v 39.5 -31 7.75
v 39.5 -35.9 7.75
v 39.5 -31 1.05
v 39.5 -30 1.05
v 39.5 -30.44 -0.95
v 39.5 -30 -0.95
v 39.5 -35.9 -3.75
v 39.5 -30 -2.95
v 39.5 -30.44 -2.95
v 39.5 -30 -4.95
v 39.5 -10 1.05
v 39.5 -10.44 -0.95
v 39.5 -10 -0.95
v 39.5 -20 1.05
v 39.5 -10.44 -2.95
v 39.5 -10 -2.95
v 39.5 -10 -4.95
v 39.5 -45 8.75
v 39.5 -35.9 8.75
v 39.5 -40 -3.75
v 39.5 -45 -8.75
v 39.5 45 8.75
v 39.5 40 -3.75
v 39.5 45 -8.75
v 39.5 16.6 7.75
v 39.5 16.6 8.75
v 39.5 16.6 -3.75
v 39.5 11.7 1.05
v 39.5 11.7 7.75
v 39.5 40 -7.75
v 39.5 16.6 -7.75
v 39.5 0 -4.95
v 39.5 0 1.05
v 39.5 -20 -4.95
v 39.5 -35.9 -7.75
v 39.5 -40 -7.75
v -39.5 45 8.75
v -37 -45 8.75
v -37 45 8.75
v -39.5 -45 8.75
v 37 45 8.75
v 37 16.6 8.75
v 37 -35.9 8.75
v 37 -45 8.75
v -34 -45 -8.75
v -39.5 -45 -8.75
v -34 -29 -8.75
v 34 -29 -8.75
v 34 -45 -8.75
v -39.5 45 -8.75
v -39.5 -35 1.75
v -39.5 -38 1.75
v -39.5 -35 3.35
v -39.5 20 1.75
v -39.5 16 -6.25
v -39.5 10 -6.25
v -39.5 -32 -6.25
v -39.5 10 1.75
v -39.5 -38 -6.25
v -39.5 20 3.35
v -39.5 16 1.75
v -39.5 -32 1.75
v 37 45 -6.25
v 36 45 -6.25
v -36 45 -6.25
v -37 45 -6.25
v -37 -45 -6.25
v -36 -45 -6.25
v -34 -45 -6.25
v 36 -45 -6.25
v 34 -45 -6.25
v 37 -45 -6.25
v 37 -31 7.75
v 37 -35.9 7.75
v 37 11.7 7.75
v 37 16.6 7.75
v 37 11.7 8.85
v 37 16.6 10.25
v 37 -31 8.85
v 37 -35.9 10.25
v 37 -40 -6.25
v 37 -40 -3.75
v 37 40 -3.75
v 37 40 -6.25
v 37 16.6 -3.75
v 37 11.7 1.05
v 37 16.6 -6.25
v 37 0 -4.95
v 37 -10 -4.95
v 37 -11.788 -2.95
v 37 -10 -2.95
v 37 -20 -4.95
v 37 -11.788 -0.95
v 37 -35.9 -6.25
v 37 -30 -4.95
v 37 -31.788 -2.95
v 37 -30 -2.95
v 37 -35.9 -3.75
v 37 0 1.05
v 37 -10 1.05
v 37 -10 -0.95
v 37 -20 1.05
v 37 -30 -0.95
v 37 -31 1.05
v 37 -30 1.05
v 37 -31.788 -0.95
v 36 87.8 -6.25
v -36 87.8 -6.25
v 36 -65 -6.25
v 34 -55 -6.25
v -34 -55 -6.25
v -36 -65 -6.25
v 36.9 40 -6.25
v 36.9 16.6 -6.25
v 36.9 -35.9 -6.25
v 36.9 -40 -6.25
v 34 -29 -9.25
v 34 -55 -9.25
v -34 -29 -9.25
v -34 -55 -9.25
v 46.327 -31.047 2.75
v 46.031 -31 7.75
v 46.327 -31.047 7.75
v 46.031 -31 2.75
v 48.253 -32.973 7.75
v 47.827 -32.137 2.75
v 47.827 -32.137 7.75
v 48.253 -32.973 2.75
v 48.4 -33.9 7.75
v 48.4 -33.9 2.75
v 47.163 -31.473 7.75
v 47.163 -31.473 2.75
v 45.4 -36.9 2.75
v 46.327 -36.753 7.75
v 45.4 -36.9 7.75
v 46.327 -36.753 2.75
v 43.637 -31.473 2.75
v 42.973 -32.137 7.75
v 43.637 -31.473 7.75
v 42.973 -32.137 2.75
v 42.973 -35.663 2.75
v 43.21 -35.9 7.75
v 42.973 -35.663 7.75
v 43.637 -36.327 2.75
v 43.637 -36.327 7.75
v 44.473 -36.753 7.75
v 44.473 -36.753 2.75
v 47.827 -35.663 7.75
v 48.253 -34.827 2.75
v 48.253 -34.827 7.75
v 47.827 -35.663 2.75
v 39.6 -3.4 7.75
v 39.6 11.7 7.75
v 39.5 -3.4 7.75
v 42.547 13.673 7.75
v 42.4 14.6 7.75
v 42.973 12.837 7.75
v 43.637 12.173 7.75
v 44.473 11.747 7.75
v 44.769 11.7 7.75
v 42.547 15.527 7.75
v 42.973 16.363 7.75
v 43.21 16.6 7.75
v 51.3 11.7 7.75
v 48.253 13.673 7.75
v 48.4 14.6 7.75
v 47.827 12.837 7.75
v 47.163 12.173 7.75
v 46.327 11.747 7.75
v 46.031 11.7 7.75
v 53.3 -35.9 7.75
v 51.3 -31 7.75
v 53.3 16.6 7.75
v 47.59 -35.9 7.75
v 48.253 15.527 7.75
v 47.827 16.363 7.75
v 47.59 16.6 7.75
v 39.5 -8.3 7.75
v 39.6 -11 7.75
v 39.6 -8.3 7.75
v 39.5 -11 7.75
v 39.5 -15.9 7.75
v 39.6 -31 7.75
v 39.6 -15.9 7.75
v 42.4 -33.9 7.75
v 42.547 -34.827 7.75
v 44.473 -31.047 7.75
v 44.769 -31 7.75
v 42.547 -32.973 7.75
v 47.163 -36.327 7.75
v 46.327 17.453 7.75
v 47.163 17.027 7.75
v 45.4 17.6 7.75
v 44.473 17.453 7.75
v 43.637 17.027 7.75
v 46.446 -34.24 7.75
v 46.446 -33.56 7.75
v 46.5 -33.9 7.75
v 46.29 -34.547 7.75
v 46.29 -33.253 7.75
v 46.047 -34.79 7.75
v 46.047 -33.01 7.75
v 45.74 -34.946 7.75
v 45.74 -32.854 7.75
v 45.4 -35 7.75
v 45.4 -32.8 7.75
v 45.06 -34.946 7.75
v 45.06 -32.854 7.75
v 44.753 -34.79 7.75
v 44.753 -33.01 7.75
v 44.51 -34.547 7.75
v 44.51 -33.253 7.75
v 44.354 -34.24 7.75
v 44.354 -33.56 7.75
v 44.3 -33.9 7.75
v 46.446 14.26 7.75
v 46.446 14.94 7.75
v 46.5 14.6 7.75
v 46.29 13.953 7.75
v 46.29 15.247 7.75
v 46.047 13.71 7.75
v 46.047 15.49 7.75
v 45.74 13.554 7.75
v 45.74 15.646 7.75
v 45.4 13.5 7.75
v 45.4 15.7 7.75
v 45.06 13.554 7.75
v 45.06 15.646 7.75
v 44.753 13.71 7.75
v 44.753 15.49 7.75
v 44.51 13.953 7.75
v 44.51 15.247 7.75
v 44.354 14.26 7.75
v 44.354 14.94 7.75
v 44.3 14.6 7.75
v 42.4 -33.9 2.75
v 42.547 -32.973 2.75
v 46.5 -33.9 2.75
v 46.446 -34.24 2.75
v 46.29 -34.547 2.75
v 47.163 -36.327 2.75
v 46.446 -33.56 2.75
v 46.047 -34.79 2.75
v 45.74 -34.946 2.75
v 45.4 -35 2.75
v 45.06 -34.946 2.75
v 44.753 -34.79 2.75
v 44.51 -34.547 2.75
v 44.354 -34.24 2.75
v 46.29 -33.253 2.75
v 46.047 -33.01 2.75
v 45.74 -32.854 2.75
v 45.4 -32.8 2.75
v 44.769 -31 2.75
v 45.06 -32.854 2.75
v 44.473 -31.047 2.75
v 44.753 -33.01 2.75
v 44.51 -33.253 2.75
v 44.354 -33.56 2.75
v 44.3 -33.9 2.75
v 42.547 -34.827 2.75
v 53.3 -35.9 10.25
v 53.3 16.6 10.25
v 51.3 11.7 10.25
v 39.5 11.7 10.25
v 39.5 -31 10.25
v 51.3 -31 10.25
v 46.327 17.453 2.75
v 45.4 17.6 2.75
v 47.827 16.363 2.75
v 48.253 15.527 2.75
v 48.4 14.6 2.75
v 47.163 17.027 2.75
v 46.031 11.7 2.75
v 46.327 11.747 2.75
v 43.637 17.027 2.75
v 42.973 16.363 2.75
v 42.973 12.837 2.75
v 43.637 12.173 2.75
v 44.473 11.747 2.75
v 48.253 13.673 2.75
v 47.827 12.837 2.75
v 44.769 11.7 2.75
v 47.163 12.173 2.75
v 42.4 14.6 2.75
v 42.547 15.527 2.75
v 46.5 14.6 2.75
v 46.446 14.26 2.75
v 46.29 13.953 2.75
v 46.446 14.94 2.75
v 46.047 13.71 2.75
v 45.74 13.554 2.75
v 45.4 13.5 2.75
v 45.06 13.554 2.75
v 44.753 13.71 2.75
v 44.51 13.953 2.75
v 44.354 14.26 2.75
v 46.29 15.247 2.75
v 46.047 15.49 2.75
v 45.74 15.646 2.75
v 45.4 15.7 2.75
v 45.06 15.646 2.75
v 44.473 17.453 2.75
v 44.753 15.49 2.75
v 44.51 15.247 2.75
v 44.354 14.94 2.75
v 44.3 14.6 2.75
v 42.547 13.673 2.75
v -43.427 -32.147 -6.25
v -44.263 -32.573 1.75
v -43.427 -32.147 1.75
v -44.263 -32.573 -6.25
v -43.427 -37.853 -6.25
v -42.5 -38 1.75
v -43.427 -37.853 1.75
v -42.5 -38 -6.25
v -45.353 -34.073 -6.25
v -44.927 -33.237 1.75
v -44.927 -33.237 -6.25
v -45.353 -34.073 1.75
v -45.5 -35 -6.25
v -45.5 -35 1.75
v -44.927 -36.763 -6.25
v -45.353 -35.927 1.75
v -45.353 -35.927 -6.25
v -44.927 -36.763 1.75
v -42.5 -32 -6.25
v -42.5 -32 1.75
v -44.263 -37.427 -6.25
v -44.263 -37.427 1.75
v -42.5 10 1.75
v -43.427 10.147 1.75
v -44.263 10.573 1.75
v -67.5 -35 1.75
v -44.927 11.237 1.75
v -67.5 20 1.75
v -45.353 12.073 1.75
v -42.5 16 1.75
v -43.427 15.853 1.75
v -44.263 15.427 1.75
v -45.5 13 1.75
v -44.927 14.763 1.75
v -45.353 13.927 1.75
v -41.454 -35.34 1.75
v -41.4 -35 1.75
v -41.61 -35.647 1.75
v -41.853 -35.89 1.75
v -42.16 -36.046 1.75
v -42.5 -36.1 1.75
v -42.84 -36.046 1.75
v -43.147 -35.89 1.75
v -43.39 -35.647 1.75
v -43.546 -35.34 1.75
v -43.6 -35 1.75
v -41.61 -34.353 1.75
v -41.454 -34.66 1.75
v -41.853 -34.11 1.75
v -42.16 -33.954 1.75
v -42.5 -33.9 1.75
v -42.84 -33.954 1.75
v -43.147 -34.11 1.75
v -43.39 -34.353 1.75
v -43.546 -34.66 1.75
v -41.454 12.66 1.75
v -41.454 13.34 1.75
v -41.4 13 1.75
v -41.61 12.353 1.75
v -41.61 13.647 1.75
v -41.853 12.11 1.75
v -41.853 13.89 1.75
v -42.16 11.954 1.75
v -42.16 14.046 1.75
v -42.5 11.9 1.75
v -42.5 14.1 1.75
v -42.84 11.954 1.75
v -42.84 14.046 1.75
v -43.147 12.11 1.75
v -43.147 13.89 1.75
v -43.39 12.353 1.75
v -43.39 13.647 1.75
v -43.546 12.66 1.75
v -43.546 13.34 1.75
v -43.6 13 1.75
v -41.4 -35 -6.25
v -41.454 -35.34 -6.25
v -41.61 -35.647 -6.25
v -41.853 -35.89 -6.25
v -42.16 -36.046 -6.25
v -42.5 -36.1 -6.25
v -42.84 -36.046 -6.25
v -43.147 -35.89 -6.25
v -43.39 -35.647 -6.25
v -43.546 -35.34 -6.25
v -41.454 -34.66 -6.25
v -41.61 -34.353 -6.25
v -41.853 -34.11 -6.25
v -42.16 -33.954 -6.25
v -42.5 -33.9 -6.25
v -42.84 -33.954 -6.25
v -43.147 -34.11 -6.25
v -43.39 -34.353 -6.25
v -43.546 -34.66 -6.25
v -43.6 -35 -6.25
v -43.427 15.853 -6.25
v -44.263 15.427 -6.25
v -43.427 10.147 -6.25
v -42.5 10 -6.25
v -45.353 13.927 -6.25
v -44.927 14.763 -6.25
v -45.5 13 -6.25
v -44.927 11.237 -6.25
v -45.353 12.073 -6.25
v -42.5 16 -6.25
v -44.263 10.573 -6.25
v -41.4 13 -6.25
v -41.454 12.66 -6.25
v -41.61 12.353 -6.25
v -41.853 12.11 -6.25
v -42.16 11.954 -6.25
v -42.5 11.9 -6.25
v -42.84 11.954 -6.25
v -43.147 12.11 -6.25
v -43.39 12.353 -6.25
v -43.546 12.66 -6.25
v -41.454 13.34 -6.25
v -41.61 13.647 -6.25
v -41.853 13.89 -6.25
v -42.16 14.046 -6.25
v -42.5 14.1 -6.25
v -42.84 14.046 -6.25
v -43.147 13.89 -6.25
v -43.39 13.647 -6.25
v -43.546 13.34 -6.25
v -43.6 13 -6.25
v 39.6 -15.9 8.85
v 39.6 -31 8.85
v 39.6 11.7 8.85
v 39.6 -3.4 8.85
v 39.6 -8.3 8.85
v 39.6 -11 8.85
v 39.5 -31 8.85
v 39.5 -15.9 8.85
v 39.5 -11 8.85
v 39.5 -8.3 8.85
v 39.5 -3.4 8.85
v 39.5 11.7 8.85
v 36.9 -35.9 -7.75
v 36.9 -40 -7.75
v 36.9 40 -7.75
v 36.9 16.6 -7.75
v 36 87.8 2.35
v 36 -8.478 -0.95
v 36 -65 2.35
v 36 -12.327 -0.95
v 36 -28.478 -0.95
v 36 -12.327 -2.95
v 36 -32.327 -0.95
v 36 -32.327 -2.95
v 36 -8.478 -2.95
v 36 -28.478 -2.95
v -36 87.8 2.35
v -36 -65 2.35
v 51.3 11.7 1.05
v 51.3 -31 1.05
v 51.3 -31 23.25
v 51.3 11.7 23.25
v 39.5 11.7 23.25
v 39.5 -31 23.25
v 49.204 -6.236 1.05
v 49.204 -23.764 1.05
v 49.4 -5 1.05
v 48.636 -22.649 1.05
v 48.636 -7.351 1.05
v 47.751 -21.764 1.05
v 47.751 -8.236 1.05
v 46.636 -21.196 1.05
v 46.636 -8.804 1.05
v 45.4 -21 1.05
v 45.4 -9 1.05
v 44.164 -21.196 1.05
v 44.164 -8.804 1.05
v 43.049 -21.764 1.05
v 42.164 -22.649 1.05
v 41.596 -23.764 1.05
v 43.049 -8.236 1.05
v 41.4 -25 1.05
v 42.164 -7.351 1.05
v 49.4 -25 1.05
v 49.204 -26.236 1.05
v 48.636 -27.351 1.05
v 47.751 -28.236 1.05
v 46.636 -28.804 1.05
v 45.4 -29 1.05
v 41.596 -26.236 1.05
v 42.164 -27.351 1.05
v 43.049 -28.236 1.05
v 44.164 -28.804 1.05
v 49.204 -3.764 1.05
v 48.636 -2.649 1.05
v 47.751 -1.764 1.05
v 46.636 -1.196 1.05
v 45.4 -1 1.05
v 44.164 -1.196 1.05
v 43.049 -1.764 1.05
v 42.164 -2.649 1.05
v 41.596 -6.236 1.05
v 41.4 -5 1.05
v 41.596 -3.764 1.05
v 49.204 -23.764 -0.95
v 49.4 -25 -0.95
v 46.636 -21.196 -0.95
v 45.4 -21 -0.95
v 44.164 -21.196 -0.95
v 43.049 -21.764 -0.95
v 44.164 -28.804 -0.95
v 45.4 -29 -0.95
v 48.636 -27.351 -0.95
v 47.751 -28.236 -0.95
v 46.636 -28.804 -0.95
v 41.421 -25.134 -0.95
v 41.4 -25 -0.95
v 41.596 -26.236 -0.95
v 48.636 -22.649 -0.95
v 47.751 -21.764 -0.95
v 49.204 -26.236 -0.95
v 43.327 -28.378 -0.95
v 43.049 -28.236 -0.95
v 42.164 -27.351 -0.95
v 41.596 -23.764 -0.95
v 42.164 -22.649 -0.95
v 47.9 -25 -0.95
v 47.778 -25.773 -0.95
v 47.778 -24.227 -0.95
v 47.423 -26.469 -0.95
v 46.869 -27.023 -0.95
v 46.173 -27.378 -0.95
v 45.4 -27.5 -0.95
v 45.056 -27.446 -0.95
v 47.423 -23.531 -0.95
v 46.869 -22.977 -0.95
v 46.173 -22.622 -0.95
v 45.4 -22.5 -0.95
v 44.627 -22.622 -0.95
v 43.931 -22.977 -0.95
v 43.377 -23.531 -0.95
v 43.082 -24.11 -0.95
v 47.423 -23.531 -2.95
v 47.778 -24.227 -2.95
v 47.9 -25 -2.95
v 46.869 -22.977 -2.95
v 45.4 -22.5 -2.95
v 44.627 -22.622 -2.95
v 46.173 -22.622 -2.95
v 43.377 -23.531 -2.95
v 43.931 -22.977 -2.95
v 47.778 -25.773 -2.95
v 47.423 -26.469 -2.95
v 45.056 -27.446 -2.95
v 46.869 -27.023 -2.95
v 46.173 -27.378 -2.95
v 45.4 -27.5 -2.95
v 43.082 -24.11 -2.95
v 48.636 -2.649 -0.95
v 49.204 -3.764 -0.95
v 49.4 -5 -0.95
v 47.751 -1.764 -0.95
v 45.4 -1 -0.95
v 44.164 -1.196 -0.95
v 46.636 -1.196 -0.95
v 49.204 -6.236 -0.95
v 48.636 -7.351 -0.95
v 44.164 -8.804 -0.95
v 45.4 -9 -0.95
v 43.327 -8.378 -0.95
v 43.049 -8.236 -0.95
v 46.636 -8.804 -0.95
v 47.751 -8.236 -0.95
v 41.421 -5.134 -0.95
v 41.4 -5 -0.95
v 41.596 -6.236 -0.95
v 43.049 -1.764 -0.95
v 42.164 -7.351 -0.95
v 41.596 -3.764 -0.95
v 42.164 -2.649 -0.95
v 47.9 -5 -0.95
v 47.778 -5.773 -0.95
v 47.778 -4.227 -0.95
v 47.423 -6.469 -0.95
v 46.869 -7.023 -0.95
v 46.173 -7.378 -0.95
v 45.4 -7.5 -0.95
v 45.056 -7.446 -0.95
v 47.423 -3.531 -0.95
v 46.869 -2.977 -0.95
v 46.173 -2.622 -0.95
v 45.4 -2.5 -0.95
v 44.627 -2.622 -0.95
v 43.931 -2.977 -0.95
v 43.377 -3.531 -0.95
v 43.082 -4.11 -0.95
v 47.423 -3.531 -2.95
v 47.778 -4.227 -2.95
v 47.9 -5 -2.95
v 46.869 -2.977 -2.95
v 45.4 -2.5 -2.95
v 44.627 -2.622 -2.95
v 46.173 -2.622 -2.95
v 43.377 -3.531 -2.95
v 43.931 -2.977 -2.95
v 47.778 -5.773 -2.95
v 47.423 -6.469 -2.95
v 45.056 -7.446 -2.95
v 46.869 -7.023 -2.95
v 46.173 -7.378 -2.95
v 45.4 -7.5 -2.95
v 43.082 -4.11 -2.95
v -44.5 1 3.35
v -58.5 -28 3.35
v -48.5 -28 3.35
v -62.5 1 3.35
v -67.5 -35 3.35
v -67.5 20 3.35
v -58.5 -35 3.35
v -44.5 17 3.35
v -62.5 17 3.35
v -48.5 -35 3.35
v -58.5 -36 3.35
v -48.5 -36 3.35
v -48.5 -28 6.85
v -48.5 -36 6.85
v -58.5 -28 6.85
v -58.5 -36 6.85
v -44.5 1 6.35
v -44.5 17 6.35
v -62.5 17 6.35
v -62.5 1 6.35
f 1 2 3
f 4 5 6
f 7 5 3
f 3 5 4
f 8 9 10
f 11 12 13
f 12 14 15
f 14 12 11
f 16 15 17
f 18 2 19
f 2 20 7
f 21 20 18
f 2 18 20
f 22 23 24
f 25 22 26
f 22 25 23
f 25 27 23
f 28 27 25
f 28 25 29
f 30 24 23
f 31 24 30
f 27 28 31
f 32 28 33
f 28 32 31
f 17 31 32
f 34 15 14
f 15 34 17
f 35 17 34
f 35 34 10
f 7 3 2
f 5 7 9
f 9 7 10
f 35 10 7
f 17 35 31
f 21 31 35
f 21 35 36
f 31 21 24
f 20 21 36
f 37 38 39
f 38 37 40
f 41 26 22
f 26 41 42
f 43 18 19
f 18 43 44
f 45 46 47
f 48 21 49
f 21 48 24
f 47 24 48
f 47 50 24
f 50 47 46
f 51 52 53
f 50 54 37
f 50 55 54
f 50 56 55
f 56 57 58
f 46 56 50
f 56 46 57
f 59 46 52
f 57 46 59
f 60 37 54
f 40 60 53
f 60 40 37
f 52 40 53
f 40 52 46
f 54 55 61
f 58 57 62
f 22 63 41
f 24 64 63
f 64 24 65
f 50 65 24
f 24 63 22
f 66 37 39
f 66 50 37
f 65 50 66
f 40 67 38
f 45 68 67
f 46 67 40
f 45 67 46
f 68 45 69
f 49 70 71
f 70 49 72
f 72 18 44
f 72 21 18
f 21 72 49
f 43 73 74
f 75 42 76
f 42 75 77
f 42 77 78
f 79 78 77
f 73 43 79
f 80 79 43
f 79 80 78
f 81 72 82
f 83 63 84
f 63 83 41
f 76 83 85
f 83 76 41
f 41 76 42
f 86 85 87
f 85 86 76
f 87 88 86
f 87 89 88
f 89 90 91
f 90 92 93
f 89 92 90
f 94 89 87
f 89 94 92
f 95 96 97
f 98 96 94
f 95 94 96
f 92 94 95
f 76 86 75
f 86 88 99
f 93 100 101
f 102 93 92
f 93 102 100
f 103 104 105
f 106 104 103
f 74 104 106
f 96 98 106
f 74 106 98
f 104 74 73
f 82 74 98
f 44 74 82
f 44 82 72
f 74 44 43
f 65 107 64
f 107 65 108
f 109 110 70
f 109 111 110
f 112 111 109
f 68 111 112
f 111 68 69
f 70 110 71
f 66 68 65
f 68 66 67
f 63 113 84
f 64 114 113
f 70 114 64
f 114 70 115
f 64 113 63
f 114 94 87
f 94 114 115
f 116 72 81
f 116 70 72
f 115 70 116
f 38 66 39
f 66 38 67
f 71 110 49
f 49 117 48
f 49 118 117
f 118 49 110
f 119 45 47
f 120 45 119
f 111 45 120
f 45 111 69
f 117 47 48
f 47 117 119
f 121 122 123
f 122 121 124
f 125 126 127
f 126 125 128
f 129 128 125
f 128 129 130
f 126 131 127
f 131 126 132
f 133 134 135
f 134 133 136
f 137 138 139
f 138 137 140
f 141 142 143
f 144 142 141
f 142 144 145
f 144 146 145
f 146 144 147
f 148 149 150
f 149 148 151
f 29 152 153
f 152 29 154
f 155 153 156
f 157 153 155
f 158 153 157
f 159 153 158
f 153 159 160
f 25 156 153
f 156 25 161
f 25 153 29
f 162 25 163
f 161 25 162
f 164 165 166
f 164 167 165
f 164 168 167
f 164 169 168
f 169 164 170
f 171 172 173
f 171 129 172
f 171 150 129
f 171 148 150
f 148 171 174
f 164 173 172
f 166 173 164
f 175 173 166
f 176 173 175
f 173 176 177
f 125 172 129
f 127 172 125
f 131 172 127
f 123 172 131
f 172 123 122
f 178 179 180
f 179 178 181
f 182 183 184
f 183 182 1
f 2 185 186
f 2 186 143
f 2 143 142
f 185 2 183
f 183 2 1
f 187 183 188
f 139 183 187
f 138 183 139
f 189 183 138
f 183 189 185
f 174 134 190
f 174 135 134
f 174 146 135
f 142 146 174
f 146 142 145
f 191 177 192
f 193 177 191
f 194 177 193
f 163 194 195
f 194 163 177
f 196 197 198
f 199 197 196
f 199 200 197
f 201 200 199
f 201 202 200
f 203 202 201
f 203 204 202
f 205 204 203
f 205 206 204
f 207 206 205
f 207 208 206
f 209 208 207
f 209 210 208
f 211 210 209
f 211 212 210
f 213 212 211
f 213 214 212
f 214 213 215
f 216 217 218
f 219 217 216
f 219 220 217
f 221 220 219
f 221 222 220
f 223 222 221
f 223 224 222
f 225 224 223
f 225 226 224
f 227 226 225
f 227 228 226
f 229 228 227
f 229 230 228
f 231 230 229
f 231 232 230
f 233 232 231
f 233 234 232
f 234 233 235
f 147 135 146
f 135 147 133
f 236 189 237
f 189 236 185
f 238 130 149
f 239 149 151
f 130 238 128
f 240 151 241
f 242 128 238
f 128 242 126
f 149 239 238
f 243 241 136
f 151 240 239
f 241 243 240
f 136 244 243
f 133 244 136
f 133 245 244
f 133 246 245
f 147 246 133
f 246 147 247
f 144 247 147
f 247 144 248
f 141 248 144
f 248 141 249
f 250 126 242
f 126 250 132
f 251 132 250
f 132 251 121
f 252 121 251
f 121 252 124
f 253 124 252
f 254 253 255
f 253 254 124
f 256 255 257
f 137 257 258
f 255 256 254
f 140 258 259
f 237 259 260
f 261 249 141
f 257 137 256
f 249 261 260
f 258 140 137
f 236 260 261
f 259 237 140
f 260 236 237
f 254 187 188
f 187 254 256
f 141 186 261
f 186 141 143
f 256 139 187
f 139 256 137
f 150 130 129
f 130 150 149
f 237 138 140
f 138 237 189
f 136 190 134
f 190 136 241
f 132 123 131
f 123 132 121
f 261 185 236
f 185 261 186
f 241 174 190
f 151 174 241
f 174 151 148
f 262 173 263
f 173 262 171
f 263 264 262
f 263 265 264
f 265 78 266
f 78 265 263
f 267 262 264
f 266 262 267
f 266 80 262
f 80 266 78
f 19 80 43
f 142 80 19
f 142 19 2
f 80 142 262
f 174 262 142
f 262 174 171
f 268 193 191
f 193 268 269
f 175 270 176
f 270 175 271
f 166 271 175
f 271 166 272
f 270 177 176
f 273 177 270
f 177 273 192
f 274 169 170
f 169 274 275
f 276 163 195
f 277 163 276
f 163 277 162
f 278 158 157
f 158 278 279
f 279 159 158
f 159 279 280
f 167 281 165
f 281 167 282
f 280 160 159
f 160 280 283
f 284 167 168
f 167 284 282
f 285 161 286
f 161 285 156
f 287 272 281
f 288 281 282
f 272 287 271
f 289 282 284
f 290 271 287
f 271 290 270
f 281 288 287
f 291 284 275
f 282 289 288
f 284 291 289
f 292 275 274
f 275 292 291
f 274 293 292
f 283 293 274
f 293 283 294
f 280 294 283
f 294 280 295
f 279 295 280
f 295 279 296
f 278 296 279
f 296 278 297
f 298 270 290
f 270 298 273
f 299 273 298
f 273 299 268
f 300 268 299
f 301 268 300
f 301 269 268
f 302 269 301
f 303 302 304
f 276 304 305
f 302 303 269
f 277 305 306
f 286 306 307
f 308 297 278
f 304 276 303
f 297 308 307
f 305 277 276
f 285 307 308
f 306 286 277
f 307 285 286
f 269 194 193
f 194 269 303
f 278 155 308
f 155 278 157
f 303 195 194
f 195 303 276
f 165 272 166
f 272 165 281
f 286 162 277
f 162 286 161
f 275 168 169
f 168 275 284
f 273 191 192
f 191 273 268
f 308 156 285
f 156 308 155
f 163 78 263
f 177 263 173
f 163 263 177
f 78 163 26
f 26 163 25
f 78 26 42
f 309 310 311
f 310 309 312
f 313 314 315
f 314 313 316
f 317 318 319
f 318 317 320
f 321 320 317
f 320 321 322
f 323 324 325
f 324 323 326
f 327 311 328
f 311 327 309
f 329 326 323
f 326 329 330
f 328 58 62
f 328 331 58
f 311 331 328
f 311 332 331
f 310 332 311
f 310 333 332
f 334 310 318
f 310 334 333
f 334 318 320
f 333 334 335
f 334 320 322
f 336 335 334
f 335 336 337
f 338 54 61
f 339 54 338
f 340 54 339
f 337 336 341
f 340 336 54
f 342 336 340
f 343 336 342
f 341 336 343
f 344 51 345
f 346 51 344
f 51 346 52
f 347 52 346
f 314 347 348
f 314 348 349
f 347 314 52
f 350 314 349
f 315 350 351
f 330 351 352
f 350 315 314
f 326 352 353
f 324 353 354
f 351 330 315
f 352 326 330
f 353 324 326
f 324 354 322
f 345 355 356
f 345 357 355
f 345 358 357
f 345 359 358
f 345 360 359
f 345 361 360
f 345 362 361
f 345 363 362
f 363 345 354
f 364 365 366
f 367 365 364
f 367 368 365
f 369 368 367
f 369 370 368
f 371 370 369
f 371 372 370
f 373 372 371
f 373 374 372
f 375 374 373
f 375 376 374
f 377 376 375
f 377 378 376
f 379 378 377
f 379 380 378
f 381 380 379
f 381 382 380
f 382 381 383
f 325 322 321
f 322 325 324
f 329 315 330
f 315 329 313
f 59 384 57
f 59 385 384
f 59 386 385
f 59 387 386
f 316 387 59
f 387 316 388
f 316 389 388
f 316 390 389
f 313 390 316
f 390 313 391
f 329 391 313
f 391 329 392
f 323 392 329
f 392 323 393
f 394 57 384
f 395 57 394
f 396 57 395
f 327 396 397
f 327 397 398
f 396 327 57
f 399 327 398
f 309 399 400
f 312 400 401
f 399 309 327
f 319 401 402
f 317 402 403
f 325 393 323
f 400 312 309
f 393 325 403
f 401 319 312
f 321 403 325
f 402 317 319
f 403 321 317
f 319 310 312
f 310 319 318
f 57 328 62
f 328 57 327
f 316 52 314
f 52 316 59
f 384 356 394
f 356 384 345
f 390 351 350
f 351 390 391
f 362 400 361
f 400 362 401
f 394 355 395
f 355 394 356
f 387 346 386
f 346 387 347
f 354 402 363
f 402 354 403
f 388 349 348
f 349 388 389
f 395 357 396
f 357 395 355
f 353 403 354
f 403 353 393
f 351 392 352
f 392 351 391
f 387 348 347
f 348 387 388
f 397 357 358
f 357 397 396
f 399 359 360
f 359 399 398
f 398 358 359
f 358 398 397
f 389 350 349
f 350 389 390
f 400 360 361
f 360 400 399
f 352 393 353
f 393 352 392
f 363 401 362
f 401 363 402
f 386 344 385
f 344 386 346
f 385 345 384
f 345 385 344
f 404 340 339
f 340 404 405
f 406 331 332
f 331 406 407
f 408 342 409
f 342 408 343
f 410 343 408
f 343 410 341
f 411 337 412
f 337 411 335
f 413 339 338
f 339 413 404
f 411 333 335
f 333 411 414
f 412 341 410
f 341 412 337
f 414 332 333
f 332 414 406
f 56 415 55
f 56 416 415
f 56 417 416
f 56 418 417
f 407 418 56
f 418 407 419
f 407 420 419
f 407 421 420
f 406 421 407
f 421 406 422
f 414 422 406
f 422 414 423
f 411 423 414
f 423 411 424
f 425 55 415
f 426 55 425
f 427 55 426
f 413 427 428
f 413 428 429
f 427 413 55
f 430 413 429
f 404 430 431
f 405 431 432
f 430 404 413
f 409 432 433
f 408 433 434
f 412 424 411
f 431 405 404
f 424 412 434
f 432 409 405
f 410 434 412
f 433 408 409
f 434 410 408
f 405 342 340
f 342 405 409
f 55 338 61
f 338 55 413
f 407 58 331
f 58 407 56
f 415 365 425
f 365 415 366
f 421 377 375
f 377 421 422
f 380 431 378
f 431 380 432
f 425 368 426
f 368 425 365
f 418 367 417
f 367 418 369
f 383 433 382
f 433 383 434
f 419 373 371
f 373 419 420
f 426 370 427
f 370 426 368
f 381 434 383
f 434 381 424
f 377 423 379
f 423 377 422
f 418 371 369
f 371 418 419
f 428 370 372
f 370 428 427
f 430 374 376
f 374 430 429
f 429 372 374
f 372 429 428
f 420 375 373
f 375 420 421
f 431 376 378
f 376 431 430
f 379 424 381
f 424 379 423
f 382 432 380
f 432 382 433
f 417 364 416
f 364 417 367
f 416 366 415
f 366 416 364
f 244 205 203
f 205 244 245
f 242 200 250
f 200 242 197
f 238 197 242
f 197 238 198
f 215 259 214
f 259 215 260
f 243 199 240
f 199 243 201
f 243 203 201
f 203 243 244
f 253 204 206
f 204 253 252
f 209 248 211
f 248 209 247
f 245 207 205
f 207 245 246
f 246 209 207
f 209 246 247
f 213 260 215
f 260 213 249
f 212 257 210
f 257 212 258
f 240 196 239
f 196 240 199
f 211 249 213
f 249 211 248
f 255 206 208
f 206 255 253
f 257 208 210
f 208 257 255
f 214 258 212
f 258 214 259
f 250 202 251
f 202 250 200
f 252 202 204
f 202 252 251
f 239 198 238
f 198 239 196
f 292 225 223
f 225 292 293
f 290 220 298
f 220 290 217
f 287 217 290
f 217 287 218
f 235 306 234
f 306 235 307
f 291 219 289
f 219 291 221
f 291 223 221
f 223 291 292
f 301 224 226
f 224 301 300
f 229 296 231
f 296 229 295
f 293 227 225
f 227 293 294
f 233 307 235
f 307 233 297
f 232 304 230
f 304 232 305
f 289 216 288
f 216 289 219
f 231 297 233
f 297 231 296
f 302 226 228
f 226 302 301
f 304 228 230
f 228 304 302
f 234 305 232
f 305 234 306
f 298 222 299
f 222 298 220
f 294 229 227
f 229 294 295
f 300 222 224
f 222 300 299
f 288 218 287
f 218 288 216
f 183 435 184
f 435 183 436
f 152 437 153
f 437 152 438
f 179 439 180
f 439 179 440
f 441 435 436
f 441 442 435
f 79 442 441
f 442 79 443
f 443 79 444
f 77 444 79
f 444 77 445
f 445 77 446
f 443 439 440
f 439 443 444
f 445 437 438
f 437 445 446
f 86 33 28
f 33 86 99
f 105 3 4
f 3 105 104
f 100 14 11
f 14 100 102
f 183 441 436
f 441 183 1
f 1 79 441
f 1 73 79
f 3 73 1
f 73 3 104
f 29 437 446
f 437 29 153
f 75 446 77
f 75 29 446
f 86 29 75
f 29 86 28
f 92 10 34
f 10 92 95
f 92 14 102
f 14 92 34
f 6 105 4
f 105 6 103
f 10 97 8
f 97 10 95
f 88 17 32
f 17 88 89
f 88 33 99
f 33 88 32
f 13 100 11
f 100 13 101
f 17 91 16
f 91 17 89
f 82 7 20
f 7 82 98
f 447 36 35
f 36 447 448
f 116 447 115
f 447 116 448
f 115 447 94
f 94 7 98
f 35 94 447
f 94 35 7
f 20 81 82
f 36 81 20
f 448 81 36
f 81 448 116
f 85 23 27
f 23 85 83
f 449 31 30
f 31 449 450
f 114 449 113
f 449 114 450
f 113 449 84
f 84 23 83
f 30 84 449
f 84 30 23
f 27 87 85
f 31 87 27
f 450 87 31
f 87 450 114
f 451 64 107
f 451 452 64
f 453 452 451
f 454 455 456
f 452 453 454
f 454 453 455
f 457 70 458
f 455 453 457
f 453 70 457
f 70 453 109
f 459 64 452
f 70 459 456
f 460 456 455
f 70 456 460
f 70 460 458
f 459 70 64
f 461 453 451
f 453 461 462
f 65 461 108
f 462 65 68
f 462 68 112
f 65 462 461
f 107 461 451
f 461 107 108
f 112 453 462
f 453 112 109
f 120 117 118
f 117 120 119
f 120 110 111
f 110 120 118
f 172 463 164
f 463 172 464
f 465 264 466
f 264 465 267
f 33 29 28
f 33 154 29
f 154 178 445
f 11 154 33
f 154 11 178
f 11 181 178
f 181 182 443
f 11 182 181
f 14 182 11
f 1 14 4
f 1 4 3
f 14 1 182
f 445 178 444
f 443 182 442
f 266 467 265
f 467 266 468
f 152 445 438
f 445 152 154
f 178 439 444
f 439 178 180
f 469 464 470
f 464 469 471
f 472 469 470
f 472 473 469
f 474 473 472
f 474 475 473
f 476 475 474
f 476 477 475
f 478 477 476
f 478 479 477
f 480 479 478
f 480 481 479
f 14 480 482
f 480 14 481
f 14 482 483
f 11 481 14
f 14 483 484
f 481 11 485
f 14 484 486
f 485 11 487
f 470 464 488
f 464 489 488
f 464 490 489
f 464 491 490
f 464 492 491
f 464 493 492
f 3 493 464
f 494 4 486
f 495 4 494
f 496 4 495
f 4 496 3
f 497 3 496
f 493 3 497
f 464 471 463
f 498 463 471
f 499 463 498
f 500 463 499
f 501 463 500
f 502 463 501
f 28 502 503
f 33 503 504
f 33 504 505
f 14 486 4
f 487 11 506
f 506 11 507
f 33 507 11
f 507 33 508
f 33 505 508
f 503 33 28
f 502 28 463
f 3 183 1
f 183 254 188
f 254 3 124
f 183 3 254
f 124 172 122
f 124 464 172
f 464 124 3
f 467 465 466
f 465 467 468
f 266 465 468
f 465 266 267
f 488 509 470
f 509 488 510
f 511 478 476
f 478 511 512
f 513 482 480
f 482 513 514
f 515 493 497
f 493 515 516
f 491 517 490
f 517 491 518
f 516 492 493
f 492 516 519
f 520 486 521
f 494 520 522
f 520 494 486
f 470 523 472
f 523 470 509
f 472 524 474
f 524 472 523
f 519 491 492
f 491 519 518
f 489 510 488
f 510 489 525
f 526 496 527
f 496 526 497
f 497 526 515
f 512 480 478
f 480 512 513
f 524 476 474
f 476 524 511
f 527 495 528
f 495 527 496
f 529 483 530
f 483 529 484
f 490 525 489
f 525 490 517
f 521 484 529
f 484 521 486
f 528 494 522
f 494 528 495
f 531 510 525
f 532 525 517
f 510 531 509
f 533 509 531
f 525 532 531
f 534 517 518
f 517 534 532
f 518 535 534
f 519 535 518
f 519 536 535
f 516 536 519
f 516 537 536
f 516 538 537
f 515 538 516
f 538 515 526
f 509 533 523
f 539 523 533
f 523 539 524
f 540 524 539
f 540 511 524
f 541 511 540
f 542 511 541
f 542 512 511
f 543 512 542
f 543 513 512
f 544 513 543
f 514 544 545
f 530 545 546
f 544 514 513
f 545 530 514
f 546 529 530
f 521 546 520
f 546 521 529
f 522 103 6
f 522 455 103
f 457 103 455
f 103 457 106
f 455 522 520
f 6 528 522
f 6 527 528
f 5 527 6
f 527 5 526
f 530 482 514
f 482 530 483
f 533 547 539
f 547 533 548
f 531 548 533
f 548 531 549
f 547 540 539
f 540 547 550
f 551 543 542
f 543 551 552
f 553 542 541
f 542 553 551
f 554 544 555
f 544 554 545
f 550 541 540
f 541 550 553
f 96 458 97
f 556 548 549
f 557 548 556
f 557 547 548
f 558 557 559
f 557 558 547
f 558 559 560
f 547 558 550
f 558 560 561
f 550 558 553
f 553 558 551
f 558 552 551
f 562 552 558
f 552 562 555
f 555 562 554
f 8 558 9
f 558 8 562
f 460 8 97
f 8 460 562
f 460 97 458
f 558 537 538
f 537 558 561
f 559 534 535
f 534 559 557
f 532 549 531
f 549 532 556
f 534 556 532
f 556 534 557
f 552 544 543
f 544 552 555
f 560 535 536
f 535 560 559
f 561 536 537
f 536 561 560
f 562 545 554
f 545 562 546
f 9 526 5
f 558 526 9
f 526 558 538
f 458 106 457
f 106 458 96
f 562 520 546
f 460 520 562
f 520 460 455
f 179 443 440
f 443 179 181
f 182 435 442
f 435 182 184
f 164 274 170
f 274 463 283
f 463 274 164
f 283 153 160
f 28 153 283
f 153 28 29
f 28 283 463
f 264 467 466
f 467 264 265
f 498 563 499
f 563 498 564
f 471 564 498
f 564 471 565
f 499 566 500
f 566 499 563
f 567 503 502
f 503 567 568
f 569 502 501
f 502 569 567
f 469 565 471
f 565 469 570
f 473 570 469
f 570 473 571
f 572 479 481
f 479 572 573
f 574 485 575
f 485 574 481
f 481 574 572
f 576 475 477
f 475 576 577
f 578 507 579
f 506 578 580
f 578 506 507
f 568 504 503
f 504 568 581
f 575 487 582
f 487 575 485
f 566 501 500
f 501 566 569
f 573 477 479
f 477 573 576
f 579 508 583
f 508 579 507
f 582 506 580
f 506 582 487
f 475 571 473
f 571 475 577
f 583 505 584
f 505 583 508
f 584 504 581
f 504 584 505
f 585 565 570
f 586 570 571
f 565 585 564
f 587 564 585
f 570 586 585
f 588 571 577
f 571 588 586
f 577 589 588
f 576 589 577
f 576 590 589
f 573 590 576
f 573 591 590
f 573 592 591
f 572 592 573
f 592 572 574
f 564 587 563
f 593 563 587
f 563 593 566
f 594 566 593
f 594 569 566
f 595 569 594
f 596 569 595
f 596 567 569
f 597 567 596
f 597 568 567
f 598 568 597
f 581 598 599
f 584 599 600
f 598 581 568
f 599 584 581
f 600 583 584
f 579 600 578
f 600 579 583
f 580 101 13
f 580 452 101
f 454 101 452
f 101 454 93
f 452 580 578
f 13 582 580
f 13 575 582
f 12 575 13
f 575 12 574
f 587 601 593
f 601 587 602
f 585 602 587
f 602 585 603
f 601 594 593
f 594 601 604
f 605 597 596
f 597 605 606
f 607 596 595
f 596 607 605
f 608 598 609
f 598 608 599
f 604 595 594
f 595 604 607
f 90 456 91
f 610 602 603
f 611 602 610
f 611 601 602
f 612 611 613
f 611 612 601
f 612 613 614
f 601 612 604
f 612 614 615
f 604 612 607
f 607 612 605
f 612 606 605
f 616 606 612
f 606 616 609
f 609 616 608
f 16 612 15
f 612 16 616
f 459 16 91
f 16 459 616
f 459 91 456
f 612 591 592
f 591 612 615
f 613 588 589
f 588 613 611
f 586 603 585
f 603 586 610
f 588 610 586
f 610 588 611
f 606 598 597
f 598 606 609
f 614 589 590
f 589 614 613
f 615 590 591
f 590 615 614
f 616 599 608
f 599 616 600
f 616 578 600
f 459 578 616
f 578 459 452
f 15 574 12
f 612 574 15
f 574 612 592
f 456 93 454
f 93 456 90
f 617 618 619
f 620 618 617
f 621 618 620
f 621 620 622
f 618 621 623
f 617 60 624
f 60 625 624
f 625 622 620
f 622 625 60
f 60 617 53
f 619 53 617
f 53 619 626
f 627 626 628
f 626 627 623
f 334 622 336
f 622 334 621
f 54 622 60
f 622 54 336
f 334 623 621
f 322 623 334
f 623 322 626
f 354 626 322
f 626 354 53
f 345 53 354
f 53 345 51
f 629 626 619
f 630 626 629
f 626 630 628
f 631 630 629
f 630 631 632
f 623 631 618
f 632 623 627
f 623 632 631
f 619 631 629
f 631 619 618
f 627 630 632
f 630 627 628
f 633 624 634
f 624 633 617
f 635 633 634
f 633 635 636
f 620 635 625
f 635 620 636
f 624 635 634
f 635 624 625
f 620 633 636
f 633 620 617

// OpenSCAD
/*
 * Assembly preview — cradle + phone + servos + ESP32
 * Uses $t (0–1) for animation rotation.
 */

use <pixel10pro_cradle.scad>

// ── Dimensions (duplicated for standalone use) ──────────────────────────
phone_w = 72;
phone_h = 152.8;
phone_d = 8.6;
clearance = 1.0;
wall = 2.5;
cradle_len = 90;
cradle_y_offset = 20;

sg90_body_w  = 22.7;
sg90_body_d  = 11.8;
sg90_body_h  = 22.2;
sg90_tab_w   = 32.5;
sg90_tab_h   = 2.5;
sg90_shaft_offset = 6;
sg90_arm_drop = 3;

inner_w = phone_w + 2 * clearance;
outer_w = inner_w + 2 * wall;

power_btn_y = 40;
voldn_btn_y = 60;

arm_z = wall + phone_d / 2;
servo_bottom_z = arm_z + sg90_arm_drop;

// ── Component models ────────────────────────────────────────────────────

module phone() {
    // Phone body
    color([0.15, 0.15, 0.15, 0.7])
        translate([wall + clearance,
                   -cradle_y_offset,
                   wall])
            cube([phone_w, phone_h, phone_d]);

    // Camera bump on the back (protrudes below the phone)
    color([0.1, 0.1, 0.1, 0.8])
        translate([wall + clearance + 2,      // 2 mm inset
                   -cradle_y_offset + 10,     // 10 mm from phone top
                   wall - 3])                 // 3 mm below phone back
            cube([phone_w - 4, 26, 3]);
}

module sg90_servo(btn_y) {
    local_y = btn_y - cradle_y_offset;
    body_start_y = local_y - sg90_shaft_offset;
    tab_extent = (sg90_tab_w - sg90_body_w) / 2;
    tab_z = servo_bottom_z + 6.7;

    servo_x = outer_w;
    shaft_x = servo_x + sg90_body_d / 2;
    shaft_y = local_y;

    // Body below tabs (gear housing end)
    color([0.2, 0.4, 0.8, 0.85])
        translate([servo_x, body_start_y, servo_bottom_z])
            cube([sg90_body_d, sg90_body_w, 6.7]);

    // Body above tabs
    color([0.2, 0.4, 0.8, 0.85])
        translate([servo_x, body_start_y, tab_z + sg90_tab_h])
            cube([sg90_body_d, sg90_body_w,
                  sg90_body_h - 6.7 - sg90_tab_h]);

    // Mounting tab ears (only the parts outside the body)
    color([0.25, 0.45, 0.85, 0.85])
        for (dy = [body_start_y - tab_extent,
                   body_start_y + sg90_body_w]) {
            translate([servo_x, dy, tab_z])
                cube([sg90_body_d, tab_extent, sg90_tab_h]);
        }

    // Gear housing bump on bottom face
    color([0.2, 0.4, 0.8])
        translate([shaft_x, shaft_y, servo_bottom_z - 2])
            cylinder(h = 2, d = 8, $fn = 20);

    // Shaft nub — below gear housing
    color([1, 1, 1])
        translate([shaft_x, shaft_y, servo_bottom_z - 4])
            cylinder(h = 2, d = 5, $fn = 20);

    // Arm — sweeps in XY at arm_z, shown in ~30° pressed position
    arm_len = 17;
    press_angle = 30;
    arm_tip_x = shaft_x - arm_len * cos(press_angle);
    arm_tip_y = shaft_y - arm_len * sin(press_angle);
    color([1, 1, 1])
        translate([0, 0, arm_z - 1])
            hull() {
                translate([shaft_x, shaft_y, 0])
                    cylinder(h = 2, d = 4, $fn = 16);
                translate([arm_tip_x, arm_tip_y, 0])
                    cylinder(h = 2, d = 3, $fn = 16);
            }
}

module esp32_board() {
    board_x = -3 - 25;
    color([0.0, 0.5, 0.0, 0.85])
        translate([board_x, 10, wall + 8])
            cube([28, 55, 1.6]);
    color([0.7, 0.7, 0.7])
        translate([board_x + 9, 10 - 1, wall + 9.6])
            cube([10, 8, 3.5]);
    color([0.7, 0.7, 0.7])
        translate([board_x + 5, 10 + 36, wall + 9.6])
            cube([18, 16, 3]);
}

// ── Animated assembly ───────────────────────────────────────────────────

rot = $t * 360;

rotate([0, 0, rot])
translate([-outer_w / 2, -cradle_len / 2, -(17.5) / 2]) {
    mobilemash_cradle();
    phone();
    sg90_servo(power_btn_y);
    sg90_servo(voldn_btn_y);
    esp32_board();
}
